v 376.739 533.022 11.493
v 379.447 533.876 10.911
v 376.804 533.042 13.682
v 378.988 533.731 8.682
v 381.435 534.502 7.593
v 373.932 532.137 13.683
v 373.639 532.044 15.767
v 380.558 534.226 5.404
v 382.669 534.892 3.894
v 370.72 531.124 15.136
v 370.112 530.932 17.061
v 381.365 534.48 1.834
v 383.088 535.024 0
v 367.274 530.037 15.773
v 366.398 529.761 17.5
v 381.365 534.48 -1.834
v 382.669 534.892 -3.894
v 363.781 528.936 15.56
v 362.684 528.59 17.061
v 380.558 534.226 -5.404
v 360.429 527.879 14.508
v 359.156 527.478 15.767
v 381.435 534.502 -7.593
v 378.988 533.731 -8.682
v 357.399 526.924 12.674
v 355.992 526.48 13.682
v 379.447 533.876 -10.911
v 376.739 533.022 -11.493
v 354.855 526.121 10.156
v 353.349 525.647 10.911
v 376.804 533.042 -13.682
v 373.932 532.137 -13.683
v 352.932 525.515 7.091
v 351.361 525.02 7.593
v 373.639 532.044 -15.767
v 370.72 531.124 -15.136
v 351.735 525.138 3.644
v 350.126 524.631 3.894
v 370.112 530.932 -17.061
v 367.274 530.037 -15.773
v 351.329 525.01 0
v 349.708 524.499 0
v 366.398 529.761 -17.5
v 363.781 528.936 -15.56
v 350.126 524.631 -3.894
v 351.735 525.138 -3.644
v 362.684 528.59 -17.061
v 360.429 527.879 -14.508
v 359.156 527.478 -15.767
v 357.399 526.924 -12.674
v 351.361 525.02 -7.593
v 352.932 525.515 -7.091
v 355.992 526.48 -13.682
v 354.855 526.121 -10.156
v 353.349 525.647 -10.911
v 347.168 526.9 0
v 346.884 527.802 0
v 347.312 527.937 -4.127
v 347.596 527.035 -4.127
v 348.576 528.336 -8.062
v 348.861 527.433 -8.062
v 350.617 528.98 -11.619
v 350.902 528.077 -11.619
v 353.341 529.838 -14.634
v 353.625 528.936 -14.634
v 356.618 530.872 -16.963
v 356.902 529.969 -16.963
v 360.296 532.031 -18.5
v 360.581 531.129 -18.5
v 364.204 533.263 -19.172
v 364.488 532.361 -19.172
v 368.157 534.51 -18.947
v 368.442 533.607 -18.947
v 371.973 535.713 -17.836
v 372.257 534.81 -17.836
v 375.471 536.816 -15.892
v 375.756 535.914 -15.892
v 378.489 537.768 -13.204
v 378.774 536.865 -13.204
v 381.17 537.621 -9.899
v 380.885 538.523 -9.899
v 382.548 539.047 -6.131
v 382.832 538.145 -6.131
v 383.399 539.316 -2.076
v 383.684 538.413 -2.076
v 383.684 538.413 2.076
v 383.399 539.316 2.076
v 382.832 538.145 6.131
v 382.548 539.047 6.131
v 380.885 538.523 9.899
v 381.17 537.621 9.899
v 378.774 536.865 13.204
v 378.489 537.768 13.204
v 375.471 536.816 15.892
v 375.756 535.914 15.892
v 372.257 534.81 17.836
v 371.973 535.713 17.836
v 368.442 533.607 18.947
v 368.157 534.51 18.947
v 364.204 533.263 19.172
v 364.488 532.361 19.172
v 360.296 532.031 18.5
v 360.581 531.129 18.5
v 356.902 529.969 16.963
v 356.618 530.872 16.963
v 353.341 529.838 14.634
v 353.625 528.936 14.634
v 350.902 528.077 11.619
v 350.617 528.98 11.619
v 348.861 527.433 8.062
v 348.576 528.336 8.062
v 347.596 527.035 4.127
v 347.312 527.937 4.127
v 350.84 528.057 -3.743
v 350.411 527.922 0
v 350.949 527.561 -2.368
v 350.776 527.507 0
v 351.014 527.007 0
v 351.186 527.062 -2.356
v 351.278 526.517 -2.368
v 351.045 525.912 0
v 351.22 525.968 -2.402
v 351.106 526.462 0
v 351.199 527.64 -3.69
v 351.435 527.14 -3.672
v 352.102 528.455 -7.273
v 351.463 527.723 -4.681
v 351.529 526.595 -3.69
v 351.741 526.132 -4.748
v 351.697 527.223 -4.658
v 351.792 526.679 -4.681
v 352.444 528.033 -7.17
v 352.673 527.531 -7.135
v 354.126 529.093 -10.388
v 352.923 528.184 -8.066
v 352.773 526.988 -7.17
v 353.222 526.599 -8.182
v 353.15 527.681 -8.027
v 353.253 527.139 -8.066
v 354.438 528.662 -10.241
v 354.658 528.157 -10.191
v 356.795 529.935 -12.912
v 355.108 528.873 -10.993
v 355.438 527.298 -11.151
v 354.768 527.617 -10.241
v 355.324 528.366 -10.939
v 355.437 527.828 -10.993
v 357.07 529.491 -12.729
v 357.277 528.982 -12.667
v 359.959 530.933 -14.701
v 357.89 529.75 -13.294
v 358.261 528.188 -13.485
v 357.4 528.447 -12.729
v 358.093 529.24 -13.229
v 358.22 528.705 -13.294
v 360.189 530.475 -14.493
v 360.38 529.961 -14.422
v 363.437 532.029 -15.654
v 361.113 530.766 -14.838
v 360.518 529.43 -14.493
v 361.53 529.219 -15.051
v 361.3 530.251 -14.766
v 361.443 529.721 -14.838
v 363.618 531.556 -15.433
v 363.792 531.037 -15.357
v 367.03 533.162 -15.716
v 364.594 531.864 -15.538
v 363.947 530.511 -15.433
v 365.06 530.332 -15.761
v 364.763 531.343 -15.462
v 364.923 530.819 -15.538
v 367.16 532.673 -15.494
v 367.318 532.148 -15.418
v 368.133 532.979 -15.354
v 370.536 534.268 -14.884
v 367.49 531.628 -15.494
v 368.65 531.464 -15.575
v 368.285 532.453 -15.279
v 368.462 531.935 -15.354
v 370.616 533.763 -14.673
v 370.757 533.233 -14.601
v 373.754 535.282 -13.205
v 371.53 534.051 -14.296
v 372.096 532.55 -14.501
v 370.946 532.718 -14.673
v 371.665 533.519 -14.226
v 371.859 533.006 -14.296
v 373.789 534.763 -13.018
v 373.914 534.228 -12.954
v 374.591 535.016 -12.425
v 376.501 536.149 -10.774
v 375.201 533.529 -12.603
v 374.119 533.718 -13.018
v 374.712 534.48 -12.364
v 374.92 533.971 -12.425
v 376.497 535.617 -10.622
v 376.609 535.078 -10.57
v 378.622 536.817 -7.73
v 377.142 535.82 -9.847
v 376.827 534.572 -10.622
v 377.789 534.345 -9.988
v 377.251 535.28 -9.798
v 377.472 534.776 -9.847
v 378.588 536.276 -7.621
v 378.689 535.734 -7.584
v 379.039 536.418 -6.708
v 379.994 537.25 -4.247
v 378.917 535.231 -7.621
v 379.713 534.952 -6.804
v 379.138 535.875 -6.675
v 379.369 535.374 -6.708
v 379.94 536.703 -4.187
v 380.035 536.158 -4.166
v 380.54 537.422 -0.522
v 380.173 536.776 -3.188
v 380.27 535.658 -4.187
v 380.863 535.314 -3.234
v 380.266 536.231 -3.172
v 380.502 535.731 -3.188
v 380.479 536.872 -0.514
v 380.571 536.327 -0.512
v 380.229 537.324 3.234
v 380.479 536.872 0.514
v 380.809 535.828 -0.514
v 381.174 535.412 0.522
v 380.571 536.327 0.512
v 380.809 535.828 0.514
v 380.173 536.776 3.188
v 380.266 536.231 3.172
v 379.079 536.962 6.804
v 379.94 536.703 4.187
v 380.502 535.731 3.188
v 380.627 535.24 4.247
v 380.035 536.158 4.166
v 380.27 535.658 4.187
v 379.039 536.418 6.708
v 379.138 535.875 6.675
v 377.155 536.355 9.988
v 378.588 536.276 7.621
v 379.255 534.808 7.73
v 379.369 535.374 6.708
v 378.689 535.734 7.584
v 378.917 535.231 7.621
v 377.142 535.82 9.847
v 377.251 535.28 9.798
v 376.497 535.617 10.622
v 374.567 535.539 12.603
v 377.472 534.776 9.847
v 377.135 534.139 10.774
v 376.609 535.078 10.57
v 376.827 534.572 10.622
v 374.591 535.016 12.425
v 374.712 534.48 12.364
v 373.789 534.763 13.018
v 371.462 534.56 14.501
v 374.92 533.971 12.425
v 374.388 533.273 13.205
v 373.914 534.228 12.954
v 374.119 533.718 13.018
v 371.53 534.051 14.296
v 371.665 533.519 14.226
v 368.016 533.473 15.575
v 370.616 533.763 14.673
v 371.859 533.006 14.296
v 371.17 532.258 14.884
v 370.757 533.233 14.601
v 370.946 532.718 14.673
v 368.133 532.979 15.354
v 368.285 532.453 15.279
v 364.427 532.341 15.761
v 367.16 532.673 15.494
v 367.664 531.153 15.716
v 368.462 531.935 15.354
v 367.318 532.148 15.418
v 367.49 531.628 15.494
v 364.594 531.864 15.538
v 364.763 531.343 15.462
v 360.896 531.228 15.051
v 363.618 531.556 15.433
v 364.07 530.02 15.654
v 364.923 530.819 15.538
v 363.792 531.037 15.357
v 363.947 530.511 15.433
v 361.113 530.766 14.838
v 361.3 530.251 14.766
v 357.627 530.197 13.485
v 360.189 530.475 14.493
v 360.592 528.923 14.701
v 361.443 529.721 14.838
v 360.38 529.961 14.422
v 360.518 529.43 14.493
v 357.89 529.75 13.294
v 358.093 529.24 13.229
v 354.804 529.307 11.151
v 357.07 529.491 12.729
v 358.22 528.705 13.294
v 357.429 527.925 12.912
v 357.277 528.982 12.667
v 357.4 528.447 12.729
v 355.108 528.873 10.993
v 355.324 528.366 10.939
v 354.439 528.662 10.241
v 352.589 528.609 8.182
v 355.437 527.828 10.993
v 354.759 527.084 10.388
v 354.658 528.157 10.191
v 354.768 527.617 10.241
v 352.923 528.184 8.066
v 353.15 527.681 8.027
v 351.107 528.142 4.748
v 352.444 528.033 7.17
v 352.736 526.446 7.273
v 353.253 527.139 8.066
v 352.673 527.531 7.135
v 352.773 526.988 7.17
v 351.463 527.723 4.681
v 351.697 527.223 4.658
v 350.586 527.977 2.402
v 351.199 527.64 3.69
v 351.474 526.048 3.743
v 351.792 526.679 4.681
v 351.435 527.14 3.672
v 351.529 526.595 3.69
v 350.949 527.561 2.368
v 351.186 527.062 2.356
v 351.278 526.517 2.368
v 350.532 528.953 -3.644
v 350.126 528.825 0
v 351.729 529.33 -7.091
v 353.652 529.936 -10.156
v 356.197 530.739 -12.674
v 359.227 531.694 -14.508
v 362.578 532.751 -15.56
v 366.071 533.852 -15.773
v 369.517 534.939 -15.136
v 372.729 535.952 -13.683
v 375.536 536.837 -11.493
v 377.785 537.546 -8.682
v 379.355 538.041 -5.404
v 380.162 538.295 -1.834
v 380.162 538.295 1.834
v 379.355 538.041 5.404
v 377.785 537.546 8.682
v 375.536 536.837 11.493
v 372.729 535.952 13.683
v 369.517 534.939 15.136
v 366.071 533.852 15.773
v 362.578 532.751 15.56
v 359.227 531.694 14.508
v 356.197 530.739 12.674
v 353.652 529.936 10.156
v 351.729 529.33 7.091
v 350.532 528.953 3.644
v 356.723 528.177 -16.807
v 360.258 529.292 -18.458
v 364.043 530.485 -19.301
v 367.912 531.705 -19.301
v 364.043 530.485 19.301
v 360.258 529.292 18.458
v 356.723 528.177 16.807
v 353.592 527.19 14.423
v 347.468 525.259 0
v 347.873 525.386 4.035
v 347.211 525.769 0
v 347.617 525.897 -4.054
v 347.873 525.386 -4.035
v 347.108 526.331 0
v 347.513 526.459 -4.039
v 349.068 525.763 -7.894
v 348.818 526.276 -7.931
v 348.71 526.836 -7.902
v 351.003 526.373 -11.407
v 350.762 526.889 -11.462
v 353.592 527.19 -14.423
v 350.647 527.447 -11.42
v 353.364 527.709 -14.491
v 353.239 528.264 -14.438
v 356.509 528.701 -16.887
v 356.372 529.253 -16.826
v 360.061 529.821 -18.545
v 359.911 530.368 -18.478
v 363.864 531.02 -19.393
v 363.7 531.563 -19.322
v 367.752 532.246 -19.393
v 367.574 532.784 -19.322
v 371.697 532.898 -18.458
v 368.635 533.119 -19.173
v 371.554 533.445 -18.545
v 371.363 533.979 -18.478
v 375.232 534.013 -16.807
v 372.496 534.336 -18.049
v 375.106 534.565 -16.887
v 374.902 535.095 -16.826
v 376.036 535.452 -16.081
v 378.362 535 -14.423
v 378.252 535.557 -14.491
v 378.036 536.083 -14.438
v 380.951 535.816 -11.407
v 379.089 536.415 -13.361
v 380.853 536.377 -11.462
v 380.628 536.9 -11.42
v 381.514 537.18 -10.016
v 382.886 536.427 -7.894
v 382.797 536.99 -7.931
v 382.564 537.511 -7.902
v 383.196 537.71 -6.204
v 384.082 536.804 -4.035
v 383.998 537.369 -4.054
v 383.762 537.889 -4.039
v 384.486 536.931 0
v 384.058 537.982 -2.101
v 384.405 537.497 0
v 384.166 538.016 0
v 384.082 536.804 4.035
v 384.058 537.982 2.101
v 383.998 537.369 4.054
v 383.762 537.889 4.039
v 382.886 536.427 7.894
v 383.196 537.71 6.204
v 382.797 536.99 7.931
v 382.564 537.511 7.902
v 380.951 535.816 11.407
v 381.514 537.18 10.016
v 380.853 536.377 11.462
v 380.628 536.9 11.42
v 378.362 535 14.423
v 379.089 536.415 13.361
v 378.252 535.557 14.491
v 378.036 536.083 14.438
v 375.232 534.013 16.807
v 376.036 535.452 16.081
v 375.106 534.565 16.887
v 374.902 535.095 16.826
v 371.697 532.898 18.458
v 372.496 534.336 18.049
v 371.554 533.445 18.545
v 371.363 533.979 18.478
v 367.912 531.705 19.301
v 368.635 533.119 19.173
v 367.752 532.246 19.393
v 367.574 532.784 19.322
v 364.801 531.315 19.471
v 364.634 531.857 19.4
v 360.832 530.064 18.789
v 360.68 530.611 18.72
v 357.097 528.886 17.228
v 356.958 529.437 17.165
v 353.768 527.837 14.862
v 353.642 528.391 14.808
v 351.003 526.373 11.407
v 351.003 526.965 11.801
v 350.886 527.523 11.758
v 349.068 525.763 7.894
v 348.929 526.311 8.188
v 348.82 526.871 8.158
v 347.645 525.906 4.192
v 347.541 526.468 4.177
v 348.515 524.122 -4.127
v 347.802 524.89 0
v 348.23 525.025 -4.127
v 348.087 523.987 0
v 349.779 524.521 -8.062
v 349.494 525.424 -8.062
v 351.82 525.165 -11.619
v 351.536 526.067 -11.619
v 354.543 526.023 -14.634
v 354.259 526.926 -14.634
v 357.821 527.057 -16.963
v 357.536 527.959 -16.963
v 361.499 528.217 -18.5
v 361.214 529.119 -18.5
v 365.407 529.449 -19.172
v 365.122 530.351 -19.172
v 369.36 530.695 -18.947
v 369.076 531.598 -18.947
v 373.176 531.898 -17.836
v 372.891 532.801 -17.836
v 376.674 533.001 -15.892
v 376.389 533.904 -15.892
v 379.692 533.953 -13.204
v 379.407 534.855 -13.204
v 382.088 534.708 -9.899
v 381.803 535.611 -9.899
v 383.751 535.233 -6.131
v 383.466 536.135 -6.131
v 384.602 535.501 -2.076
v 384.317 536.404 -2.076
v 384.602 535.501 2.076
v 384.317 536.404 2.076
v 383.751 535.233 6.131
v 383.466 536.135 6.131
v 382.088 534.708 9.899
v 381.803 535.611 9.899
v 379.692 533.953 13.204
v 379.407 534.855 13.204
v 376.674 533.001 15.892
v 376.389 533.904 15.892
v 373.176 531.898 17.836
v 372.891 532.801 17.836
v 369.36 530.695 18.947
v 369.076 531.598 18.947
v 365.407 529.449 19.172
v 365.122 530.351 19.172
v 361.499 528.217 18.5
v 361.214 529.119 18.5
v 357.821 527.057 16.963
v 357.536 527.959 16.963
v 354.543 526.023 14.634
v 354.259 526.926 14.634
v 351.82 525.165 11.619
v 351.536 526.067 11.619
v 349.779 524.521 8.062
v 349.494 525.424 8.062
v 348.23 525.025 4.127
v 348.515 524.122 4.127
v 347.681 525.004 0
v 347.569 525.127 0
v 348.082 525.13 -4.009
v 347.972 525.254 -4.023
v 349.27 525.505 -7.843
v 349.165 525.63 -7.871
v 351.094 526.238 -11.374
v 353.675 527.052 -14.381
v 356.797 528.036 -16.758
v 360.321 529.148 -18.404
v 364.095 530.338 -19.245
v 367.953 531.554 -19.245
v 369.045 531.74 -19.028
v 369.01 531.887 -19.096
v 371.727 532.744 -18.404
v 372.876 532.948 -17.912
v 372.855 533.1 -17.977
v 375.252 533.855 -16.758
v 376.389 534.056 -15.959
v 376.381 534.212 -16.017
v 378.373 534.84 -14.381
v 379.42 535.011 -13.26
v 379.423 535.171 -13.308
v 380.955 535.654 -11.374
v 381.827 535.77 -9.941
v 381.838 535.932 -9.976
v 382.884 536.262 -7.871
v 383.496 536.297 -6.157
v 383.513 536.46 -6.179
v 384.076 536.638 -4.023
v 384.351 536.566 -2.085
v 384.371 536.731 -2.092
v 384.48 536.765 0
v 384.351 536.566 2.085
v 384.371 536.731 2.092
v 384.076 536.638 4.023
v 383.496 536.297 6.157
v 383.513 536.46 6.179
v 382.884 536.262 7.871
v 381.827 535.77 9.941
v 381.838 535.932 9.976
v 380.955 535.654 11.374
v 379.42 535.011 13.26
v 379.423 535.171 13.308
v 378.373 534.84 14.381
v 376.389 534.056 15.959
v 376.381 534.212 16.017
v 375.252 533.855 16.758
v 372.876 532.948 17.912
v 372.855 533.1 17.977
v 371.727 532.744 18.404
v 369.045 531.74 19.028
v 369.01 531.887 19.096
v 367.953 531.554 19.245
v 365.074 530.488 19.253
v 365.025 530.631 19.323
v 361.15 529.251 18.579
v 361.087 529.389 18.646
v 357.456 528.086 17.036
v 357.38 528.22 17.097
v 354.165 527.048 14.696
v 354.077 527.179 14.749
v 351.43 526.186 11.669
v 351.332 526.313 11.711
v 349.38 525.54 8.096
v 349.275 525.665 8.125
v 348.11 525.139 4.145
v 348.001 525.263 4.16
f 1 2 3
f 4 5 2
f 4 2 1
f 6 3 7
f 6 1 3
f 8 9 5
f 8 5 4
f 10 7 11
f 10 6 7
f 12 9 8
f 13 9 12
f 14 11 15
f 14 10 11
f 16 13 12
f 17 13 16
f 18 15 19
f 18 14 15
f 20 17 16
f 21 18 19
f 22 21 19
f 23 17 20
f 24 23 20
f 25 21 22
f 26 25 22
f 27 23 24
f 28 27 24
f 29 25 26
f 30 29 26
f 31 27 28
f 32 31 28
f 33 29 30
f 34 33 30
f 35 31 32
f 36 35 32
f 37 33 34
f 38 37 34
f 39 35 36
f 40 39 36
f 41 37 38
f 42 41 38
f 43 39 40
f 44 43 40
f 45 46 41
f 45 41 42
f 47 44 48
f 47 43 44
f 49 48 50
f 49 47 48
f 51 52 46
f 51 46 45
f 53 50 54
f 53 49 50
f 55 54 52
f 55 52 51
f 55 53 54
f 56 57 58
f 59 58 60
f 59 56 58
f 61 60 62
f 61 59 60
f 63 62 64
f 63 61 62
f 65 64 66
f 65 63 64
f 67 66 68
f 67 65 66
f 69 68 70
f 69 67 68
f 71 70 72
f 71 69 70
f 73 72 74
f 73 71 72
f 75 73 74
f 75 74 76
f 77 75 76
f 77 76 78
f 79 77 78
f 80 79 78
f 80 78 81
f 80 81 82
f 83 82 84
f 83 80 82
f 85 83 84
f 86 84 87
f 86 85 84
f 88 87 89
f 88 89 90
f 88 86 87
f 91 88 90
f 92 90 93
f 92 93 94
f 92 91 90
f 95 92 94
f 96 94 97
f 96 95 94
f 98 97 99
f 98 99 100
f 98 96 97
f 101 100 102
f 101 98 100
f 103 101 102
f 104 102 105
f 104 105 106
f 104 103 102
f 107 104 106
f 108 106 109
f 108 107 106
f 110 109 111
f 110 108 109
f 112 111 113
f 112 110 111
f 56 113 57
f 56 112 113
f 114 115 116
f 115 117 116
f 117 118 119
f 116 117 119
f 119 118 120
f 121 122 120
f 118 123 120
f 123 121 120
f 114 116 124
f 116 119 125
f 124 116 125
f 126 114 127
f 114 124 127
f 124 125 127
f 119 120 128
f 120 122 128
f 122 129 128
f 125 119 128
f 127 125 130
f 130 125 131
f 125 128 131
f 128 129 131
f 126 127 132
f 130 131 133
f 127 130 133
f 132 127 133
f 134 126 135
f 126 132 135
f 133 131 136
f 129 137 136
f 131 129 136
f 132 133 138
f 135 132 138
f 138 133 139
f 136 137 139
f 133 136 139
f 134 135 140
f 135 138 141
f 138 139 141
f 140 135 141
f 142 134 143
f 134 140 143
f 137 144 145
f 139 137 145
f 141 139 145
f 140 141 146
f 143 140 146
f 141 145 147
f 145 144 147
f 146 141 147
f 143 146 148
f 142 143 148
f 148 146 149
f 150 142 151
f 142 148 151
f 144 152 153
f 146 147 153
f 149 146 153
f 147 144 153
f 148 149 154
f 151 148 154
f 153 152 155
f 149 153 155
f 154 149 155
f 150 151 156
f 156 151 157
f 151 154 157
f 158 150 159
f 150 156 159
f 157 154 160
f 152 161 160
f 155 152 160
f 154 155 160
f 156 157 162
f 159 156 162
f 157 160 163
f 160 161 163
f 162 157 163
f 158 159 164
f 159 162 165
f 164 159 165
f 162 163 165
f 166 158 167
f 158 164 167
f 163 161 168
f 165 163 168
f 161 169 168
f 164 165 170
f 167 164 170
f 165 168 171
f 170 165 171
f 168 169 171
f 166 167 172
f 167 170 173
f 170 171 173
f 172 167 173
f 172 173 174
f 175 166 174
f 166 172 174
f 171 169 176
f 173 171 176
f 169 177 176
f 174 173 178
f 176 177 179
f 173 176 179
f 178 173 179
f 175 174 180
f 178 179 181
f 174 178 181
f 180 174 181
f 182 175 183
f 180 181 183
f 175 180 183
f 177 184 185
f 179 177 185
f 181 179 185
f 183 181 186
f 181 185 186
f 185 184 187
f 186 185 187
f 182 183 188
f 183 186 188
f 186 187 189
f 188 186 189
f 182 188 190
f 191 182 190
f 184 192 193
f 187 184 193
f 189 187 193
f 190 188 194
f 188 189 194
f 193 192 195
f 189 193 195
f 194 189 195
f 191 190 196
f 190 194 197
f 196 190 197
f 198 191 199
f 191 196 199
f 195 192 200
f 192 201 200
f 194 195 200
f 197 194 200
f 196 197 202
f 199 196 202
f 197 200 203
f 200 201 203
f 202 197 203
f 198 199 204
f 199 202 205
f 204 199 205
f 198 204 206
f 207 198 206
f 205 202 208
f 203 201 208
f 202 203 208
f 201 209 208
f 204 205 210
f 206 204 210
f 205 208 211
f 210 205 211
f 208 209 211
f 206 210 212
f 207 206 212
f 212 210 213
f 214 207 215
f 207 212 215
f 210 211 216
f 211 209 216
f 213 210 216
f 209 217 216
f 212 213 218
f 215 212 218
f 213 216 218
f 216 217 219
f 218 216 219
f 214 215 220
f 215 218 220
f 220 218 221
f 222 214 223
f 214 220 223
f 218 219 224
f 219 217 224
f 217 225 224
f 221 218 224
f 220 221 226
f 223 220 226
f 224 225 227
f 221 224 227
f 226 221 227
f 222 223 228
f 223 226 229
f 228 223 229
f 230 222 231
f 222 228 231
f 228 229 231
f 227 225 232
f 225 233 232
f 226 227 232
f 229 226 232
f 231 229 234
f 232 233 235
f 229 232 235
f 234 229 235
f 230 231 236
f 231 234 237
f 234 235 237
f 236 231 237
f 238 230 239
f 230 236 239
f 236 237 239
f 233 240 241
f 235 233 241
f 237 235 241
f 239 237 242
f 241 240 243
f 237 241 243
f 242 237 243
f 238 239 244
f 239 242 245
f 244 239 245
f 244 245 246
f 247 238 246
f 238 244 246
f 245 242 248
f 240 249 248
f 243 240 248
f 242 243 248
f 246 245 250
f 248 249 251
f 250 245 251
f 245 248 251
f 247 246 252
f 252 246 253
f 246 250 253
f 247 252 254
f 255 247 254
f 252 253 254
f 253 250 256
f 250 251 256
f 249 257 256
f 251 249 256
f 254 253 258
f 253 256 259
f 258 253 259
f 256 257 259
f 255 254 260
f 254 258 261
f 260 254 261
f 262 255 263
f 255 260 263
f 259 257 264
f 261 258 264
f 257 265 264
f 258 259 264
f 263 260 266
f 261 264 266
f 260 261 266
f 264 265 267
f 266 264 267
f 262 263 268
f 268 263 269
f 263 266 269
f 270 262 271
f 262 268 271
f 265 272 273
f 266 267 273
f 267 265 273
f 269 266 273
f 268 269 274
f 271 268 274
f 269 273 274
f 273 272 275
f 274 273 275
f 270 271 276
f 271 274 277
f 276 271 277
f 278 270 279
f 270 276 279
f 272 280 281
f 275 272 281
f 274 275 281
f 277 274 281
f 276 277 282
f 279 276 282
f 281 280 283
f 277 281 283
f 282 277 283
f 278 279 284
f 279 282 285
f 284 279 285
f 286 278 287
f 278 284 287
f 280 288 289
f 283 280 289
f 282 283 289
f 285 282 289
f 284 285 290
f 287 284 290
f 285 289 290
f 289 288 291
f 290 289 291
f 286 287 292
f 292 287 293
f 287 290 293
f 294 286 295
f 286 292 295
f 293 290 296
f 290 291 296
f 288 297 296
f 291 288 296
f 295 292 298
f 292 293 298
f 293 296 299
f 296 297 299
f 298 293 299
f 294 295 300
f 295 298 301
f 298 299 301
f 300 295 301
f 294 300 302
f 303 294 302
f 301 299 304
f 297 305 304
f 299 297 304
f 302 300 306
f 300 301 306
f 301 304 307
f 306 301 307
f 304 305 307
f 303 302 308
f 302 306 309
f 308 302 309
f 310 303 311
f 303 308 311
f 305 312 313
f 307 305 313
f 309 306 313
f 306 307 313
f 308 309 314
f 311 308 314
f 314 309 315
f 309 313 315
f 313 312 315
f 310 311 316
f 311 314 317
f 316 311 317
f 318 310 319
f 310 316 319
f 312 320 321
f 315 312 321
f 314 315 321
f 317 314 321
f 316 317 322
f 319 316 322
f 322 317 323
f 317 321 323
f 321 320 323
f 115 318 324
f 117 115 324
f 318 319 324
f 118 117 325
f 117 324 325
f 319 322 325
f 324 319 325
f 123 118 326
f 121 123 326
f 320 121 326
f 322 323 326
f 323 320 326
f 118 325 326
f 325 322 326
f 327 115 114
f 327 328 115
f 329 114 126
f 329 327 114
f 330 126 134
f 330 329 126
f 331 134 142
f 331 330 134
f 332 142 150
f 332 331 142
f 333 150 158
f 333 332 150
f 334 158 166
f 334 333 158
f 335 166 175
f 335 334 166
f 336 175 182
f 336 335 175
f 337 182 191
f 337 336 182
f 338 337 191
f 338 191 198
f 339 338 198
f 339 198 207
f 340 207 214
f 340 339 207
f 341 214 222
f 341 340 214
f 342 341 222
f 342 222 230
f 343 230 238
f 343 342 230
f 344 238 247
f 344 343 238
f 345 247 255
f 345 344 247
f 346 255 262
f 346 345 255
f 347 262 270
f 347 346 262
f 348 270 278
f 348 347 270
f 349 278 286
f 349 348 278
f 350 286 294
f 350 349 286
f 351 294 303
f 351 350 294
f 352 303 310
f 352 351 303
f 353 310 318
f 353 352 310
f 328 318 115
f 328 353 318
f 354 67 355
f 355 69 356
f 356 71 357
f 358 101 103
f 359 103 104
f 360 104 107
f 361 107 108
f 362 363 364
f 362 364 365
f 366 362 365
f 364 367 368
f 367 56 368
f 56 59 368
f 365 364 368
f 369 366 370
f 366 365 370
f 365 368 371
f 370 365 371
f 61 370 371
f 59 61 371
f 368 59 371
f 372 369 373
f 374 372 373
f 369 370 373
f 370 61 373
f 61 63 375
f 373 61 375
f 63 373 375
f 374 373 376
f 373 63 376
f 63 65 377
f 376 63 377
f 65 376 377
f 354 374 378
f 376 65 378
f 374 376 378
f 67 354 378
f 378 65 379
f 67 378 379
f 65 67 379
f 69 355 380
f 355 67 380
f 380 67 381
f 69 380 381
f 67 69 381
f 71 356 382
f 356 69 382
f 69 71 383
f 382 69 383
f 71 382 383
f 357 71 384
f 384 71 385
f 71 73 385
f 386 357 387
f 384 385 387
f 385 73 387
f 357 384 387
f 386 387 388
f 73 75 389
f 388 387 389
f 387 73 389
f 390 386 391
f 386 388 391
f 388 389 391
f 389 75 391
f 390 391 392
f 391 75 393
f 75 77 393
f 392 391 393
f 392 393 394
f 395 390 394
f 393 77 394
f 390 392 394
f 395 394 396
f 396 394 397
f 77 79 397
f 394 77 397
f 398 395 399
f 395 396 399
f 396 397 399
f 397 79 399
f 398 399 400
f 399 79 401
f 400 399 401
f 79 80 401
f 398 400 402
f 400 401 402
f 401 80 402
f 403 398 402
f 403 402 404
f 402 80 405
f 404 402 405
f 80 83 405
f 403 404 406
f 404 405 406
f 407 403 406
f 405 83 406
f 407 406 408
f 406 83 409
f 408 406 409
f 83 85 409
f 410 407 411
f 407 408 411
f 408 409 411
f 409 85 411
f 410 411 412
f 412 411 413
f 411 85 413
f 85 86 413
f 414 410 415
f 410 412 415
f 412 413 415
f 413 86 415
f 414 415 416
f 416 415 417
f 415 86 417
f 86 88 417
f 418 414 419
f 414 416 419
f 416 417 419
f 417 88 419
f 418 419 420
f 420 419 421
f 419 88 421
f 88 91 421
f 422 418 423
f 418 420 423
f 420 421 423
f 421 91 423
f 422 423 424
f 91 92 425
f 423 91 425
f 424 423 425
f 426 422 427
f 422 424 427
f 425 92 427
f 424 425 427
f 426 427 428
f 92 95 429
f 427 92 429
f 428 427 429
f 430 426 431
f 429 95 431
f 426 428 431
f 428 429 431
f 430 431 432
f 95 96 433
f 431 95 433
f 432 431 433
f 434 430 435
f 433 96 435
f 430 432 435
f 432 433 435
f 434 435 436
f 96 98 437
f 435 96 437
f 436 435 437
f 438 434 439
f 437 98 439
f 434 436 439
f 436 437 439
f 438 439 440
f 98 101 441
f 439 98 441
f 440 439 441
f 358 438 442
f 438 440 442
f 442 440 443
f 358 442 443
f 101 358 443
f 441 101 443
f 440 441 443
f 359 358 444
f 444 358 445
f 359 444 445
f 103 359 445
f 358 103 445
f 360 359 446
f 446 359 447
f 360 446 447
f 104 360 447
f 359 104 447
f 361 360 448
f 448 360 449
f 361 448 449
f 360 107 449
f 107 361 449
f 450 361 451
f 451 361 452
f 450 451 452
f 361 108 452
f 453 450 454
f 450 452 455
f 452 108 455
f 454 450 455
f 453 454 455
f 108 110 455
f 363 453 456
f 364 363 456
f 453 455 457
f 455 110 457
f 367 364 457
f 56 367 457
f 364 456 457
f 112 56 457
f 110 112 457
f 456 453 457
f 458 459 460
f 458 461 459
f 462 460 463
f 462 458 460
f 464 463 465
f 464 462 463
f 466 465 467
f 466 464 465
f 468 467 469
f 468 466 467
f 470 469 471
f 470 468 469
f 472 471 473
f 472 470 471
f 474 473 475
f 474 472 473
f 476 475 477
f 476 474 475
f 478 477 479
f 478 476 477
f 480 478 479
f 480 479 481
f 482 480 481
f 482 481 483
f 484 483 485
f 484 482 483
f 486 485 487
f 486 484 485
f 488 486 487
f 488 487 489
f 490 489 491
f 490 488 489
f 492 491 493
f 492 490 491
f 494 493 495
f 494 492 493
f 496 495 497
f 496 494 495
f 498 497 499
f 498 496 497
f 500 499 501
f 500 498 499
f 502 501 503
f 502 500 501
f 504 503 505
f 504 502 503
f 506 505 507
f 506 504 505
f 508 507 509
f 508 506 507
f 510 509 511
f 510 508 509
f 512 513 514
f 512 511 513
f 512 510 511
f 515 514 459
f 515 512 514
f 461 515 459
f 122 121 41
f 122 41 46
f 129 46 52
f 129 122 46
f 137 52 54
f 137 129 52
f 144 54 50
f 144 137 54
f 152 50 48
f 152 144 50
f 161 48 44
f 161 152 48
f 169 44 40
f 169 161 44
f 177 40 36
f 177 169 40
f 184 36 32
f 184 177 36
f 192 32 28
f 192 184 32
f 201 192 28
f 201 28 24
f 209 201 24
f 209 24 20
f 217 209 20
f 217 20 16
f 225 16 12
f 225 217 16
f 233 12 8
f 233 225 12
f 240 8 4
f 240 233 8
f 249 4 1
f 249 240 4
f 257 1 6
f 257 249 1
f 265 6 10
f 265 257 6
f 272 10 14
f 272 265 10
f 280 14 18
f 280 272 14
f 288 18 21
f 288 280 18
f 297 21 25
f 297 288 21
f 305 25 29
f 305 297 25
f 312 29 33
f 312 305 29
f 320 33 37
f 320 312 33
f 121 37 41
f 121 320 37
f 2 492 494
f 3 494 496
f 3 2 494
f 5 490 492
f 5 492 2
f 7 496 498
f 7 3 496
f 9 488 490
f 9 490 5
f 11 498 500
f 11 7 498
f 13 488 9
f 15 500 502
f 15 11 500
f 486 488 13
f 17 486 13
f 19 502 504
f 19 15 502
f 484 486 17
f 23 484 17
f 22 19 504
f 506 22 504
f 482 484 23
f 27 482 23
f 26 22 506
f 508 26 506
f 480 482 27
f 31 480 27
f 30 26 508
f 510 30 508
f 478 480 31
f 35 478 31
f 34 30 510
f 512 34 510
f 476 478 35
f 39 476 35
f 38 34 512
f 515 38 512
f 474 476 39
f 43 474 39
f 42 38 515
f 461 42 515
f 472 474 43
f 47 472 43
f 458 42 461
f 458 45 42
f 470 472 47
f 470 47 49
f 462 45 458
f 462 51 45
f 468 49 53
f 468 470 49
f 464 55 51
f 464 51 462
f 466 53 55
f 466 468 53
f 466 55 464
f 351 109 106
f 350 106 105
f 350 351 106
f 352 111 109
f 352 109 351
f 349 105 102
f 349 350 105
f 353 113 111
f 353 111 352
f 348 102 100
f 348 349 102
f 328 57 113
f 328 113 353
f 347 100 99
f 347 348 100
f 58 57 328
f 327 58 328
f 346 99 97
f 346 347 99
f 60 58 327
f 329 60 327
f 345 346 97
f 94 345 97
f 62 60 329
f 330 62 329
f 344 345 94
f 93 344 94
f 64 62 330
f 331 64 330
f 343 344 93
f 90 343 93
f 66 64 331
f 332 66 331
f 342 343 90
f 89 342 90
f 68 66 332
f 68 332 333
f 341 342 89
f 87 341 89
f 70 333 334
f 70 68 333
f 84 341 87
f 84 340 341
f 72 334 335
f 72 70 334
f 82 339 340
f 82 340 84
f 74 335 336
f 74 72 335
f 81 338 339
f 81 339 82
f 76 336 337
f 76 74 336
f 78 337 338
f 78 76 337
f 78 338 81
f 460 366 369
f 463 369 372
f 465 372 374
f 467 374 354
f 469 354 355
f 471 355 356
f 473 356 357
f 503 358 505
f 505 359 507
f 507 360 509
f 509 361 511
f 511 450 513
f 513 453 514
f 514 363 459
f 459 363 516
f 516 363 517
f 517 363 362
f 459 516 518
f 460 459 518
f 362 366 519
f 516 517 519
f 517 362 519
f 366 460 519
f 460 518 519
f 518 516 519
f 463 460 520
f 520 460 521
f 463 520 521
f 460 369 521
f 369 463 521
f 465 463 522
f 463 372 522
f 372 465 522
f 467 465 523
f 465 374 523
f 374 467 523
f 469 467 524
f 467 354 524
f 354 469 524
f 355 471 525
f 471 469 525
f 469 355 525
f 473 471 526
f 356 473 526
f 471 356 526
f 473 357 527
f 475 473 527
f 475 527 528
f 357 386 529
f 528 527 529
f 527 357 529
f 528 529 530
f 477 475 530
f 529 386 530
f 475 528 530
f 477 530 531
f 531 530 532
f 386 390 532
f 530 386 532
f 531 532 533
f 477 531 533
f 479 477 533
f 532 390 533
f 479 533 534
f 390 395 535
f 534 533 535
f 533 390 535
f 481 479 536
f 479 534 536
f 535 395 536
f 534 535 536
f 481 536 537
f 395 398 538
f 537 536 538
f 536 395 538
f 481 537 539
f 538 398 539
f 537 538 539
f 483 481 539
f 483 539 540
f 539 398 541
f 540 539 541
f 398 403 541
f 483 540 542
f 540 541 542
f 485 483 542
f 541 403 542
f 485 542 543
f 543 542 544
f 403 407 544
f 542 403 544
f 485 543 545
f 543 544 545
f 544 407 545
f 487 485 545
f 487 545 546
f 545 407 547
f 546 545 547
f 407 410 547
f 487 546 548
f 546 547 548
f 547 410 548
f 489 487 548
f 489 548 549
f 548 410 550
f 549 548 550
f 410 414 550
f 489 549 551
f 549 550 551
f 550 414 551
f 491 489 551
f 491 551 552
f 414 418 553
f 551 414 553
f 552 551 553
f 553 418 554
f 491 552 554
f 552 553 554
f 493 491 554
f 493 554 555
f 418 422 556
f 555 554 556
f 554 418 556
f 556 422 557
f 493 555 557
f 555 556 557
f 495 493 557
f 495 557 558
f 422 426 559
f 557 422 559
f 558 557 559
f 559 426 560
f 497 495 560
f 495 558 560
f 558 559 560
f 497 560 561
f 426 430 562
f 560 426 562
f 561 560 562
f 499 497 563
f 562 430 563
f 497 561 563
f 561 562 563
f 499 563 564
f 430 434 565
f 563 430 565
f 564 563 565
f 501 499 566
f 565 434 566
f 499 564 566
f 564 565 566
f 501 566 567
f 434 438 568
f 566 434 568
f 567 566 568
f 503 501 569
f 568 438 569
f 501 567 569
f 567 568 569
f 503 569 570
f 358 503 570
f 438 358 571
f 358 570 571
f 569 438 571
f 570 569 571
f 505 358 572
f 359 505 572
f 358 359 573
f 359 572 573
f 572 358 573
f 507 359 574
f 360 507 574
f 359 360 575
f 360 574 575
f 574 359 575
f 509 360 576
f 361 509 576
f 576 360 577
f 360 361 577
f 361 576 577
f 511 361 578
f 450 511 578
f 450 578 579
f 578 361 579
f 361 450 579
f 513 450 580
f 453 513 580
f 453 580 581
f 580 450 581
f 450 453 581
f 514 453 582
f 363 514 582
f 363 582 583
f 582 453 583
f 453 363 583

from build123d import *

# Parameters (mm, degrees)
SK_BOLAS_R = 2.0000000000000018


with BuildPart() as part:
    # Sk_Jaula → Jaula (revolve)
    with BuildSketch(Plane.XY, mode=Mode.PRIVATE) as jaula_sk:
        Polygon((380.26368558200323, 538.3272855976807), (383.50631412034375, 539.3497141586763), (384.70917125092683, 535.5348570547463), (381.4665427125863, 534.5124284937507), align=None)
    revolve(jaula_sk.sketch.rotate(Axis((363.69142860825076, 538.3445713117901, 0), (0.3007142826457713, -0.9537142759825079, 0)), 180), axis=Axis((363.69142860825076, 538.3445713117901, 0), (0.3007142826457713, -0.9537142759825079, 0)))

    # Sk_Bolas → Bolas (revolve)
    with BuildSketch(Plane.XY, mode=Mode.PRIVATE) as bolas_sk:
        with Locations((382.486428416465, 536.9310713262134)):
            Circle(SK_BOLAS_R)
    revolve(bolas_sk.sketch.rotate(Axis((362.7892857603134, 541.2057141397376, 0), (0.3007142826457754, -0.9537142759825067, 0)), 180), axis=Axis((362.7892857603134, 541.2057141397376, 0), (0.3007142826457754, -0.9537142759825067, 0)))


solid = part.part
